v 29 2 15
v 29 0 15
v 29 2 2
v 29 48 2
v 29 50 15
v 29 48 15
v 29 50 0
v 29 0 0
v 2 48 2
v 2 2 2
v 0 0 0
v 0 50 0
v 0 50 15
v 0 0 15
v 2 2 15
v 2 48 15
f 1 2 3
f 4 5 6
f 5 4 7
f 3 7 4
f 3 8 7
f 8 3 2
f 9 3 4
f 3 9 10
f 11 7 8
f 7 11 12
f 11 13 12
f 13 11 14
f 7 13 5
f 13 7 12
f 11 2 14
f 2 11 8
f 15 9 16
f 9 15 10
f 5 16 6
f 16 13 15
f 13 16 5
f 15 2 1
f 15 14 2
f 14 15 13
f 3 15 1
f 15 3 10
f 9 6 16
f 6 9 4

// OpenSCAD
//Slab
//cube(size = [74.5,74.5,3]);
batteryl=27;
batteryL=46;
batteryh=13;
ep = 2;

//Tray
//top
topx =0;
topy = 0;
topz =0;
translate([topx,topy,topz]);

cube(size = [batteryl+ep,batteryL+ep*2,ep]);

//side
translate([topx,topy,topz+ep])cube(size = [ep,batteryL+ep*2,batteryh]);
//translate([topx+batteryl+ep,topy,topz+ep])cube(size = [ep,batteryL+ep,batteryh]);
//cube(size = [2,batteryL,batteryh]);


translate([topx+ep,topy,topz+ep])cube(size = [batteryl,ep,batteryh]);
translate([topx+ep,topy+batteryL+ep,topz+ep])cube(size = [batteryl,ep,batteryh]);
//cube(size = [13,5,2]);
